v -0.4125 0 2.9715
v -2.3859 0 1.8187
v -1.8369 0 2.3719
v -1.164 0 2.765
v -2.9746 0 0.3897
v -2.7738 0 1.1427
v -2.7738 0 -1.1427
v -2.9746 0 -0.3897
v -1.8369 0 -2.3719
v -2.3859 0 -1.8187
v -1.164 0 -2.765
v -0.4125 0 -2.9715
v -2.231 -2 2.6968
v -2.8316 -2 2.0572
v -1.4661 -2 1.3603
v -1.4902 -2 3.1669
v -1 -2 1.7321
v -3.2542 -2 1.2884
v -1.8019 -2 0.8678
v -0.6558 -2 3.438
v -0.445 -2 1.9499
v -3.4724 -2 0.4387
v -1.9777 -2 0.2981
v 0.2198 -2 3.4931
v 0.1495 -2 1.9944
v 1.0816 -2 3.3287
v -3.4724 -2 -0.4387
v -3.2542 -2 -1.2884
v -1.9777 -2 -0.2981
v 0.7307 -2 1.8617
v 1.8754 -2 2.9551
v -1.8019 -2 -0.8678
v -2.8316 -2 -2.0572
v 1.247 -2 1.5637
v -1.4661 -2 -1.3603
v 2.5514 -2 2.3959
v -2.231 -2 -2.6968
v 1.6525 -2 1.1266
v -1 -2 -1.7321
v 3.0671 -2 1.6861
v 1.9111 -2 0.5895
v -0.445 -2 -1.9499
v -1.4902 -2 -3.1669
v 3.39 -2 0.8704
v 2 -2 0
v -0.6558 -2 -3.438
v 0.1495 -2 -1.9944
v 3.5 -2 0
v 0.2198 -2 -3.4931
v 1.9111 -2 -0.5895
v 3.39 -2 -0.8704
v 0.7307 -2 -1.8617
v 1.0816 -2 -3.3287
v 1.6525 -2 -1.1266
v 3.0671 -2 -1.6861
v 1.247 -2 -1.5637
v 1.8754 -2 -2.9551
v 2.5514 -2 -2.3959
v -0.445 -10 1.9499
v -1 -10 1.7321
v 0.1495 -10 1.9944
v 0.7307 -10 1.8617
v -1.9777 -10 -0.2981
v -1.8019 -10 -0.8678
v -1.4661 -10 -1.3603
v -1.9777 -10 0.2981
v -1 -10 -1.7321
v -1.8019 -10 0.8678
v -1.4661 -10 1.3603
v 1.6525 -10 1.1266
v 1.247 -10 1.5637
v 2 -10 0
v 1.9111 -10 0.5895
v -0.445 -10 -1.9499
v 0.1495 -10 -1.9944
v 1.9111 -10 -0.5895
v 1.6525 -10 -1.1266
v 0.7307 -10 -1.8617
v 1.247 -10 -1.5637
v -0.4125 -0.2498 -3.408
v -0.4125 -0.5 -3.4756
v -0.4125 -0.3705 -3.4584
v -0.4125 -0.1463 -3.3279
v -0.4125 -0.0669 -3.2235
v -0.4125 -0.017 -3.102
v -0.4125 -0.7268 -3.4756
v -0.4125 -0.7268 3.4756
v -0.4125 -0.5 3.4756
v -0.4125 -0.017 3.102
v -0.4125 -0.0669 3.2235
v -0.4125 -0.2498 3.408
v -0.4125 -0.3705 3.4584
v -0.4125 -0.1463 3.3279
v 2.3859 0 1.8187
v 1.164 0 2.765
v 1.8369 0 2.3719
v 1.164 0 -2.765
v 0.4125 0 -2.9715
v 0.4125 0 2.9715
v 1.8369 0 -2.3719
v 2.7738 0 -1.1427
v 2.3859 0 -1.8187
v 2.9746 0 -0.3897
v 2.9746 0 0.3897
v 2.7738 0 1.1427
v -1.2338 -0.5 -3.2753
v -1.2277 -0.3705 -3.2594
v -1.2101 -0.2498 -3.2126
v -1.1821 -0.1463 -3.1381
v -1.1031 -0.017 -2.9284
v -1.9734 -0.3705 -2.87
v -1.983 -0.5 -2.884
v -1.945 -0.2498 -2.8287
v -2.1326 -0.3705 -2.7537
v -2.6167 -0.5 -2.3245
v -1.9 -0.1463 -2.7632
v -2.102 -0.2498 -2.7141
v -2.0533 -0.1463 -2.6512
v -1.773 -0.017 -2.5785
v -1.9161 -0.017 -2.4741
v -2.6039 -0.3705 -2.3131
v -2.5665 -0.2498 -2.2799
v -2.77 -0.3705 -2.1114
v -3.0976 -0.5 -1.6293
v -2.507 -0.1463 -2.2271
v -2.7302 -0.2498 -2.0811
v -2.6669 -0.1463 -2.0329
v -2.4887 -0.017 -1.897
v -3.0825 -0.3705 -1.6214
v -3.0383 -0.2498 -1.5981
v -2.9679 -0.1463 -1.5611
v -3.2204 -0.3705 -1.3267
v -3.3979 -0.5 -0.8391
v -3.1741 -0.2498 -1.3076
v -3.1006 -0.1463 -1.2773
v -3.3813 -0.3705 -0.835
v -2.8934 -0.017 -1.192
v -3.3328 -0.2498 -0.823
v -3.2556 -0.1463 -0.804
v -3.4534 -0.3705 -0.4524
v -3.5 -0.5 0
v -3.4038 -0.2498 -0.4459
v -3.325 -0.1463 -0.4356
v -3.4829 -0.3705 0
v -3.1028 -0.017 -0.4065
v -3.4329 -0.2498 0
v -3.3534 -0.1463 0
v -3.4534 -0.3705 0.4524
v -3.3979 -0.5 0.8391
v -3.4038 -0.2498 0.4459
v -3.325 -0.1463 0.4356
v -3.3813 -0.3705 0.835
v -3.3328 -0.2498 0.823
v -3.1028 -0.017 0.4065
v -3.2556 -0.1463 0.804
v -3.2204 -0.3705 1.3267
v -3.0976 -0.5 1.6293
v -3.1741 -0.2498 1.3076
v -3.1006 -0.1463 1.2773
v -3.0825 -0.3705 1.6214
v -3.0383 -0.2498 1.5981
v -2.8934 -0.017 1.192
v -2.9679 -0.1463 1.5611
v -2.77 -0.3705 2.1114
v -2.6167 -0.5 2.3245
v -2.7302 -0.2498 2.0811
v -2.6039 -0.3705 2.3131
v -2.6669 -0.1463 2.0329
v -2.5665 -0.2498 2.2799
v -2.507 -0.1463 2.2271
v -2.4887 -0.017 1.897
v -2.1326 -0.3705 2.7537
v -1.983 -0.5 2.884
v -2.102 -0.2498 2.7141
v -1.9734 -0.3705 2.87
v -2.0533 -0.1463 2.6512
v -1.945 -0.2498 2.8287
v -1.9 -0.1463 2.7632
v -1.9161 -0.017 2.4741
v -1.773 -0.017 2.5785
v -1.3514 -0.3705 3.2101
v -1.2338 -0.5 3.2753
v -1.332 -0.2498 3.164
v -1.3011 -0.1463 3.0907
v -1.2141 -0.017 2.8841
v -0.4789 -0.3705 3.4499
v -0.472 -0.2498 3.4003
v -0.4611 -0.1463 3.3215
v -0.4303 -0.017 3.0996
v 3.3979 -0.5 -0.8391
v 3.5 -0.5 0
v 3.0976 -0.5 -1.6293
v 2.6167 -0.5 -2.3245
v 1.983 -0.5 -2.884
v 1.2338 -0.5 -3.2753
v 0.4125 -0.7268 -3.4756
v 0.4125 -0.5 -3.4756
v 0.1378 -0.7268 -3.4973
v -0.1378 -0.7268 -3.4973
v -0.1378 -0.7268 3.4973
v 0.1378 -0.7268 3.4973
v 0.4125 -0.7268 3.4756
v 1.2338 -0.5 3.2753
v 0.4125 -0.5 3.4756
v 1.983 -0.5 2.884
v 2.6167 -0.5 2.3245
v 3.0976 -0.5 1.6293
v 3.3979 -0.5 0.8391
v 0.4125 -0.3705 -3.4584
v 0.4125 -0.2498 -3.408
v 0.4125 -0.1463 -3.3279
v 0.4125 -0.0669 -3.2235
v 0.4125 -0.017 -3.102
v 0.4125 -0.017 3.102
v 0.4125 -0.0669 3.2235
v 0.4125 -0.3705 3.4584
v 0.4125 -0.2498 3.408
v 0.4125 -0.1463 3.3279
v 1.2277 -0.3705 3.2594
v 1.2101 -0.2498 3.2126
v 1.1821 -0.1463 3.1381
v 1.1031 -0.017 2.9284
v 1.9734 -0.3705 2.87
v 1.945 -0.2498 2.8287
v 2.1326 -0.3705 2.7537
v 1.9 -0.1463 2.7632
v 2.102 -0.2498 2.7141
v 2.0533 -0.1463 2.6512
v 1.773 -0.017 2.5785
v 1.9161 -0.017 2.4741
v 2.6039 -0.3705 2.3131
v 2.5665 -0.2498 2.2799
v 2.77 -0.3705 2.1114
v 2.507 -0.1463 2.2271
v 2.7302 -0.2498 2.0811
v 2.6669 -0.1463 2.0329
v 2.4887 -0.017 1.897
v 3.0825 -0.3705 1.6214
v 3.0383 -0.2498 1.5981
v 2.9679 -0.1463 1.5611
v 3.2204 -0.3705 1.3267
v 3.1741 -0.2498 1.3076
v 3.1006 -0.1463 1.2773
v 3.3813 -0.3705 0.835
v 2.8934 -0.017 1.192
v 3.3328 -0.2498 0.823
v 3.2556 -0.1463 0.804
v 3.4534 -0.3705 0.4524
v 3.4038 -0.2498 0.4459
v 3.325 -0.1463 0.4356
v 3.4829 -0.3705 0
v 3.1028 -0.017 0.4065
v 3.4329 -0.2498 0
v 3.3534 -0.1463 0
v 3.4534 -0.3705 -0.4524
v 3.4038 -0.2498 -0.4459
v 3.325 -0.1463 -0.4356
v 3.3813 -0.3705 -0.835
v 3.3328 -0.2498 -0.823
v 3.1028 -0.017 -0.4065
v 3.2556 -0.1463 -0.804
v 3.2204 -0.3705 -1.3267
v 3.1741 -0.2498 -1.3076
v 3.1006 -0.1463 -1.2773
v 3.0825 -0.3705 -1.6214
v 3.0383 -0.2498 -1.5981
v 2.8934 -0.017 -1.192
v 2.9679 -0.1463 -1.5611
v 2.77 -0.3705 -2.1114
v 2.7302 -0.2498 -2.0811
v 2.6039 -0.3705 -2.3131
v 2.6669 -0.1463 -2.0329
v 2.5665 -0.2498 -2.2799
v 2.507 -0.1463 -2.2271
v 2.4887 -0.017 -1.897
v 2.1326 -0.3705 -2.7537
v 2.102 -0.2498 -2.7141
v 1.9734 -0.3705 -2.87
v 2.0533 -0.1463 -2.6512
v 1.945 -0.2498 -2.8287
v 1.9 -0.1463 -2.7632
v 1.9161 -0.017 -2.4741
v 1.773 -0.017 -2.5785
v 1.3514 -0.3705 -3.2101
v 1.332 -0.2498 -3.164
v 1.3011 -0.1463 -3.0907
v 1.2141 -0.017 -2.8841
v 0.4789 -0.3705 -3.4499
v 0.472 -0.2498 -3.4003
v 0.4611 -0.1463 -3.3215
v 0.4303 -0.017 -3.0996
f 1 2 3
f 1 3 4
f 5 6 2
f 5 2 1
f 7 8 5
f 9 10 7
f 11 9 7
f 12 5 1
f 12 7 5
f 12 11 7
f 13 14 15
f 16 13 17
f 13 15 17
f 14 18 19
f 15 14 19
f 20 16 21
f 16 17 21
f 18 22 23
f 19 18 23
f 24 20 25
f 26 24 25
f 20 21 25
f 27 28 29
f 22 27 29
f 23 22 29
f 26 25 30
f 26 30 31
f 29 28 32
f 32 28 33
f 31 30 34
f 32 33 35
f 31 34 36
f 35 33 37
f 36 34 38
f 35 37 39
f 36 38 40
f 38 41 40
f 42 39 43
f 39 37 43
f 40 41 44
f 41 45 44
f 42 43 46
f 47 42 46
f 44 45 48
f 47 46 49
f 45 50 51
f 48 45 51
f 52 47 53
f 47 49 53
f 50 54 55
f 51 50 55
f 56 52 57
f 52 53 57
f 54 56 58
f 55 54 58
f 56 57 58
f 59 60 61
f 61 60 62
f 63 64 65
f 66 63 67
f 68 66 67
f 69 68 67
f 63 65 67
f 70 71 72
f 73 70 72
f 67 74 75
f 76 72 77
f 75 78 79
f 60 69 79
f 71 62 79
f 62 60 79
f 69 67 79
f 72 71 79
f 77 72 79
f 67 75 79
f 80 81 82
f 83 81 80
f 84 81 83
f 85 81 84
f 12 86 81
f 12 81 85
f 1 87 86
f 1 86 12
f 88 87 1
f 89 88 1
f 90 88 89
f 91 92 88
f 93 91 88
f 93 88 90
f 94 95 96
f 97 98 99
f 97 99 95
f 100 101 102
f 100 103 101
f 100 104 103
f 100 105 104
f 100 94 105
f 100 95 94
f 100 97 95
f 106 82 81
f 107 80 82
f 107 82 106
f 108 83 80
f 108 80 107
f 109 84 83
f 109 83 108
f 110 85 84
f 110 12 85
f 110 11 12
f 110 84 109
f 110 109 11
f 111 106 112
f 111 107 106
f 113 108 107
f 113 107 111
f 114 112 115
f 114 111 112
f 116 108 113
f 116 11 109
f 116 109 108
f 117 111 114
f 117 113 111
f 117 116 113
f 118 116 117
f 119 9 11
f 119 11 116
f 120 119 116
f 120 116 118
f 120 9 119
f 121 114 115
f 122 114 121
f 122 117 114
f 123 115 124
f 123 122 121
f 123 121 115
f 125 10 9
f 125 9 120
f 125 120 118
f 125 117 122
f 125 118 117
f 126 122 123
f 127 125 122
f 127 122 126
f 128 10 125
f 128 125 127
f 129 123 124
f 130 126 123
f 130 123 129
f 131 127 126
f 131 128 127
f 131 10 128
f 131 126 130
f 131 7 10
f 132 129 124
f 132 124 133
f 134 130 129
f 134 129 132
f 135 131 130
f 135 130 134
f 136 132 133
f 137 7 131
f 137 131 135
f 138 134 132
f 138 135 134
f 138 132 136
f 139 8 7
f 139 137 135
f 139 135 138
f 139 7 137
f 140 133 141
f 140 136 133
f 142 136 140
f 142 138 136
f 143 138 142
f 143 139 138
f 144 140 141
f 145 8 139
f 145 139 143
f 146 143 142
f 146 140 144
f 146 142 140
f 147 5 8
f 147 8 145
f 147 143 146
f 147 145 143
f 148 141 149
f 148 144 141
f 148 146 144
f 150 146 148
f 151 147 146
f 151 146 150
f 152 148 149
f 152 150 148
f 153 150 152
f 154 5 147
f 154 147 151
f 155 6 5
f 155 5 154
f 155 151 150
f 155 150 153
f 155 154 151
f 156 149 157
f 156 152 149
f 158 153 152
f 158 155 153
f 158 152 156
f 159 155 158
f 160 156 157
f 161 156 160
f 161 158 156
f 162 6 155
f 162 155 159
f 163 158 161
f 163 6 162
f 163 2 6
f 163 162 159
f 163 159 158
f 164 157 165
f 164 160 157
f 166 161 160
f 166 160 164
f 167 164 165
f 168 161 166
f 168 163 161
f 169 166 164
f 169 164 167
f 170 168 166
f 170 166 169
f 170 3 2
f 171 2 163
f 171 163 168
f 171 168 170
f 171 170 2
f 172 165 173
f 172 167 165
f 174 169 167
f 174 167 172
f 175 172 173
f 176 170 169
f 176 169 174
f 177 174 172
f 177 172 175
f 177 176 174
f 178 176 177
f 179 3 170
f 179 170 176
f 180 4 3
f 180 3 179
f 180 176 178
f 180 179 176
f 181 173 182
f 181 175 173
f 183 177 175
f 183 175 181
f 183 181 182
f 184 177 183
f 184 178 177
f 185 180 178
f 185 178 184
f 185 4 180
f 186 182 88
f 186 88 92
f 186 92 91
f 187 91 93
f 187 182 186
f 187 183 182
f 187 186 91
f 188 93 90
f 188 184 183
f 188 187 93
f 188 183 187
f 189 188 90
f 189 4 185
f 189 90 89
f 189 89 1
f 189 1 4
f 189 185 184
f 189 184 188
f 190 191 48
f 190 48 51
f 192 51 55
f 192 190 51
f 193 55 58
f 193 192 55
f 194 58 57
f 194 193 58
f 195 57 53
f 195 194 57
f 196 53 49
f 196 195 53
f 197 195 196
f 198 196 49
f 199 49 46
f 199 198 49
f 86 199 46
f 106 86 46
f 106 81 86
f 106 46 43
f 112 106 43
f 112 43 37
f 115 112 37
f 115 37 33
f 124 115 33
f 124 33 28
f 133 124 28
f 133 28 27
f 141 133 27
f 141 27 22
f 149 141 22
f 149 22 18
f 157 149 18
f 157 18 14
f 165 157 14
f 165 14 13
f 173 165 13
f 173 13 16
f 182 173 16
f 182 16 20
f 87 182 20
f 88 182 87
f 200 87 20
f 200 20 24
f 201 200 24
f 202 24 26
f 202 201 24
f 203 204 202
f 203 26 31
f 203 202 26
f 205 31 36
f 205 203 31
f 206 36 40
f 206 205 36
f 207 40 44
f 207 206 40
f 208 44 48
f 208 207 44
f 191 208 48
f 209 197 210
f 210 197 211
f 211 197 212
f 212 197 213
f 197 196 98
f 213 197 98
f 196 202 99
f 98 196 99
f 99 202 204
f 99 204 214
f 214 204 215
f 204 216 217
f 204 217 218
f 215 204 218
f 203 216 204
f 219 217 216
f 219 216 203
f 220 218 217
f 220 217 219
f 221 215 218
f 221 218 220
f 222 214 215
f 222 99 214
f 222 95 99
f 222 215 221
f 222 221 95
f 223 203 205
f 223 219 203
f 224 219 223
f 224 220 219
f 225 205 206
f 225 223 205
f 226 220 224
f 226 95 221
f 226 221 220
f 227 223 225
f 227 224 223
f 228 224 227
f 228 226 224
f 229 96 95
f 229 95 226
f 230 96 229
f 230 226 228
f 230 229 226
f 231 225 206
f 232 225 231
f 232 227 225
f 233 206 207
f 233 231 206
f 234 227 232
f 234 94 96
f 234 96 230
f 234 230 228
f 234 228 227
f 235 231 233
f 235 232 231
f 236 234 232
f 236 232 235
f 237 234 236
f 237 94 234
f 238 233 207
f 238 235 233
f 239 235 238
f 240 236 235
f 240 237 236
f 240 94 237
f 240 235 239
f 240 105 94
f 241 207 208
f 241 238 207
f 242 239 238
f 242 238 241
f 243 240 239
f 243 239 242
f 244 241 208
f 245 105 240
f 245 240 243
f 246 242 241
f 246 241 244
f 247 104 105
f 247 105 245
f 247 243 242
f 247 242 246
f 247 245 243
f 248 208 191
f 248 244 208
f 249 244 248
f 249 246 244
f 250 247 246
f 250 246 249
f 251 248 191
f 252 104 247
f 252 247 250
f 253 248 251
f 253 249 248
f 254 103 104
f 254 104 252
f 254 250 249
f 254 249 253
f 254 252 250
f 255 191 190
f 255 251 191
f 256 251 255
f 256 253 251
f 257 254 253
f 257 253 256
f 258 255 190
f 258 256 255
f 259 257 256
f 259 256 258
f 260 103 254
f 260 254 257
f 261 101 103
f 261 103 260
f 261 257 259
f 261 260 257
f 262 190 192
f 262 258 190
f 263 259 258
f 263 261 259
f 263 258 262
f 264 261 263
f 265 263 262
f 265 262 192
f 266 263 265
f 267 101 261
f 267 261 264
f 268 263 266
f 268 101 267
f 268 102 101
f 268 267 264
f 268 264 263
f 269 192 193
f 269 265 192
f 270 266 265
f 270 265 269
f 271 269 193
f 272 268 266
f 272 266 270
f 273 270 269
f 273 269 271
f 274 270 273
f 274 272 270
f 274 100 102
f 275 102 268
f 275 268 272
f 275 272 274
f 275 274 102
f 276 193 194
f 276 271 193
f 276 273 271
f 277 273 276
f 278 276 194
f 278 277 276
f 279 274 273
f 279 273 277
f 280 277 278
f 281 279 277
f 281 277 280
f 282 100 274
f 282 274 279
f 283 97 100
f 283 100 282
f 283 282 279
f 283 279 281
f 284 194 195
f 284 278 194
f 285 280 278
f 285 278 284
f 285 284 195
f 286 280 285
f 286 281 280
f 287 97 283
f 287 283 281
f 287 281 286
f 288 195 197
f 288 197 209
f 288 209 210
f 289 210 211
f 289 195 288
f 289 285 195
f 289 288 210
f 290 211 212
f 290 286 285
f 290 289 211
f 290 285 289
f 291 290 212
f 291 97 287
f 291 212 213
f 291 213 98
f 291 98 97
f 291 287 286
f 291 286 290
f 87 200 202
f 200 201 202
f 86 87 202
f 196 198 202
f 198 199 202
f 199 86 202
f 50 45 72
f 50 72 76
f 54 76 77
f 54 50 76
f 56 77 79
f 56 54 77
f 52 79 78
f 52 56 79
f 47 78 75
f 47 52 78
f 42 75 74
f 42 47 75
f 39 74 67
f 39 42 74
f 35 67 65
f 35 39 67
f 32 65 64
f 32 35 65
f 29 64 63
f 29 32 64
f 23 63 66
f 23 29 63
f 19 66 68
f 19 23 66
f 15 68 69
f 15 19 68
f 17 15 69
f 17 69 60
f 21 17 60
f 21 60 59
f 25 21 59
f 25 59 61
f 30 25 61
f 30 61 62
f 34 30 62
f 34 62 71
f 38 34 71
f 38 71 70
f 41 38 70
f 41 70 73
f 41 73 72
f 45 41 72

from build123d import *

# Parameters (mm, degrees)
SKETCH1_R               = 3.5
SKETCH1_R_2             = 2
BOSS_EXTRUDE1_DEPTH     = 2
SKETCH1_2_R             = 2
BOSS_EXTRUDE2_DEPTH     = 10
SKETCH2_W               = 0.824993444
SKETCH2_H               = 1.453522708
CUT_EXTRUDE1_DEPTH      = 4.5
CUT_EXTRUDE1_DEPTH_BACK = 4.5
FILLET2_R               = 0.5


with BuildPart() as part:
    # Sketch1 → Boss-Extrude1 (new body)
    with BuildSketch(Plane(origin=(0, 0, 0), x_dir=(1, 0, 0), z_dir=(0, 1, 0))):
        Circle(SKETCH1_R)
        Circle(SKETCH1_R_2, mode=Mode.SUBTRACT)
    extrude(amount=-BOSS_EXTRUDE1_DEPTH)

    # Sketch1<2> → Boss-Extrude2 (add)
    with BuildSketch(Plane(origin=(0, 0, 0), x_dir=(1, 0, 0), z_dir=(0, 1, 0))):
        Circle(SKETCH1_2_R)
    extrude(amount=-BOSS_EXTRUDE2_DEPTH)

    # Sketch2 → Cut-Extrude1 (cut, two sides)
    with BuildSketch(Plane.XY) as cut_extrude1_sk:
        Rectangle(SKETCH2_W, SKETCH2_H)
    extrude(amount=CUT_EXTRUDE1_DEPTH, mode=Mode.SUBTRACT)
    extrude(cut_extrude1_sk.sketch, amount=-CUT_EXTRUDE1_DEPTH_BACK, mode=Mode.SUBTRACT)

    # Fillet2
    fillet2_edges = [part.edges().sort_by_distance(p)[0] for p in [
        (2.616652301, 0, -2.324463537),
        (-3.5, 0, 0),
    ]]
    fillet(fillet2_edges, radius=FILLET2_R)


solid = part.part
